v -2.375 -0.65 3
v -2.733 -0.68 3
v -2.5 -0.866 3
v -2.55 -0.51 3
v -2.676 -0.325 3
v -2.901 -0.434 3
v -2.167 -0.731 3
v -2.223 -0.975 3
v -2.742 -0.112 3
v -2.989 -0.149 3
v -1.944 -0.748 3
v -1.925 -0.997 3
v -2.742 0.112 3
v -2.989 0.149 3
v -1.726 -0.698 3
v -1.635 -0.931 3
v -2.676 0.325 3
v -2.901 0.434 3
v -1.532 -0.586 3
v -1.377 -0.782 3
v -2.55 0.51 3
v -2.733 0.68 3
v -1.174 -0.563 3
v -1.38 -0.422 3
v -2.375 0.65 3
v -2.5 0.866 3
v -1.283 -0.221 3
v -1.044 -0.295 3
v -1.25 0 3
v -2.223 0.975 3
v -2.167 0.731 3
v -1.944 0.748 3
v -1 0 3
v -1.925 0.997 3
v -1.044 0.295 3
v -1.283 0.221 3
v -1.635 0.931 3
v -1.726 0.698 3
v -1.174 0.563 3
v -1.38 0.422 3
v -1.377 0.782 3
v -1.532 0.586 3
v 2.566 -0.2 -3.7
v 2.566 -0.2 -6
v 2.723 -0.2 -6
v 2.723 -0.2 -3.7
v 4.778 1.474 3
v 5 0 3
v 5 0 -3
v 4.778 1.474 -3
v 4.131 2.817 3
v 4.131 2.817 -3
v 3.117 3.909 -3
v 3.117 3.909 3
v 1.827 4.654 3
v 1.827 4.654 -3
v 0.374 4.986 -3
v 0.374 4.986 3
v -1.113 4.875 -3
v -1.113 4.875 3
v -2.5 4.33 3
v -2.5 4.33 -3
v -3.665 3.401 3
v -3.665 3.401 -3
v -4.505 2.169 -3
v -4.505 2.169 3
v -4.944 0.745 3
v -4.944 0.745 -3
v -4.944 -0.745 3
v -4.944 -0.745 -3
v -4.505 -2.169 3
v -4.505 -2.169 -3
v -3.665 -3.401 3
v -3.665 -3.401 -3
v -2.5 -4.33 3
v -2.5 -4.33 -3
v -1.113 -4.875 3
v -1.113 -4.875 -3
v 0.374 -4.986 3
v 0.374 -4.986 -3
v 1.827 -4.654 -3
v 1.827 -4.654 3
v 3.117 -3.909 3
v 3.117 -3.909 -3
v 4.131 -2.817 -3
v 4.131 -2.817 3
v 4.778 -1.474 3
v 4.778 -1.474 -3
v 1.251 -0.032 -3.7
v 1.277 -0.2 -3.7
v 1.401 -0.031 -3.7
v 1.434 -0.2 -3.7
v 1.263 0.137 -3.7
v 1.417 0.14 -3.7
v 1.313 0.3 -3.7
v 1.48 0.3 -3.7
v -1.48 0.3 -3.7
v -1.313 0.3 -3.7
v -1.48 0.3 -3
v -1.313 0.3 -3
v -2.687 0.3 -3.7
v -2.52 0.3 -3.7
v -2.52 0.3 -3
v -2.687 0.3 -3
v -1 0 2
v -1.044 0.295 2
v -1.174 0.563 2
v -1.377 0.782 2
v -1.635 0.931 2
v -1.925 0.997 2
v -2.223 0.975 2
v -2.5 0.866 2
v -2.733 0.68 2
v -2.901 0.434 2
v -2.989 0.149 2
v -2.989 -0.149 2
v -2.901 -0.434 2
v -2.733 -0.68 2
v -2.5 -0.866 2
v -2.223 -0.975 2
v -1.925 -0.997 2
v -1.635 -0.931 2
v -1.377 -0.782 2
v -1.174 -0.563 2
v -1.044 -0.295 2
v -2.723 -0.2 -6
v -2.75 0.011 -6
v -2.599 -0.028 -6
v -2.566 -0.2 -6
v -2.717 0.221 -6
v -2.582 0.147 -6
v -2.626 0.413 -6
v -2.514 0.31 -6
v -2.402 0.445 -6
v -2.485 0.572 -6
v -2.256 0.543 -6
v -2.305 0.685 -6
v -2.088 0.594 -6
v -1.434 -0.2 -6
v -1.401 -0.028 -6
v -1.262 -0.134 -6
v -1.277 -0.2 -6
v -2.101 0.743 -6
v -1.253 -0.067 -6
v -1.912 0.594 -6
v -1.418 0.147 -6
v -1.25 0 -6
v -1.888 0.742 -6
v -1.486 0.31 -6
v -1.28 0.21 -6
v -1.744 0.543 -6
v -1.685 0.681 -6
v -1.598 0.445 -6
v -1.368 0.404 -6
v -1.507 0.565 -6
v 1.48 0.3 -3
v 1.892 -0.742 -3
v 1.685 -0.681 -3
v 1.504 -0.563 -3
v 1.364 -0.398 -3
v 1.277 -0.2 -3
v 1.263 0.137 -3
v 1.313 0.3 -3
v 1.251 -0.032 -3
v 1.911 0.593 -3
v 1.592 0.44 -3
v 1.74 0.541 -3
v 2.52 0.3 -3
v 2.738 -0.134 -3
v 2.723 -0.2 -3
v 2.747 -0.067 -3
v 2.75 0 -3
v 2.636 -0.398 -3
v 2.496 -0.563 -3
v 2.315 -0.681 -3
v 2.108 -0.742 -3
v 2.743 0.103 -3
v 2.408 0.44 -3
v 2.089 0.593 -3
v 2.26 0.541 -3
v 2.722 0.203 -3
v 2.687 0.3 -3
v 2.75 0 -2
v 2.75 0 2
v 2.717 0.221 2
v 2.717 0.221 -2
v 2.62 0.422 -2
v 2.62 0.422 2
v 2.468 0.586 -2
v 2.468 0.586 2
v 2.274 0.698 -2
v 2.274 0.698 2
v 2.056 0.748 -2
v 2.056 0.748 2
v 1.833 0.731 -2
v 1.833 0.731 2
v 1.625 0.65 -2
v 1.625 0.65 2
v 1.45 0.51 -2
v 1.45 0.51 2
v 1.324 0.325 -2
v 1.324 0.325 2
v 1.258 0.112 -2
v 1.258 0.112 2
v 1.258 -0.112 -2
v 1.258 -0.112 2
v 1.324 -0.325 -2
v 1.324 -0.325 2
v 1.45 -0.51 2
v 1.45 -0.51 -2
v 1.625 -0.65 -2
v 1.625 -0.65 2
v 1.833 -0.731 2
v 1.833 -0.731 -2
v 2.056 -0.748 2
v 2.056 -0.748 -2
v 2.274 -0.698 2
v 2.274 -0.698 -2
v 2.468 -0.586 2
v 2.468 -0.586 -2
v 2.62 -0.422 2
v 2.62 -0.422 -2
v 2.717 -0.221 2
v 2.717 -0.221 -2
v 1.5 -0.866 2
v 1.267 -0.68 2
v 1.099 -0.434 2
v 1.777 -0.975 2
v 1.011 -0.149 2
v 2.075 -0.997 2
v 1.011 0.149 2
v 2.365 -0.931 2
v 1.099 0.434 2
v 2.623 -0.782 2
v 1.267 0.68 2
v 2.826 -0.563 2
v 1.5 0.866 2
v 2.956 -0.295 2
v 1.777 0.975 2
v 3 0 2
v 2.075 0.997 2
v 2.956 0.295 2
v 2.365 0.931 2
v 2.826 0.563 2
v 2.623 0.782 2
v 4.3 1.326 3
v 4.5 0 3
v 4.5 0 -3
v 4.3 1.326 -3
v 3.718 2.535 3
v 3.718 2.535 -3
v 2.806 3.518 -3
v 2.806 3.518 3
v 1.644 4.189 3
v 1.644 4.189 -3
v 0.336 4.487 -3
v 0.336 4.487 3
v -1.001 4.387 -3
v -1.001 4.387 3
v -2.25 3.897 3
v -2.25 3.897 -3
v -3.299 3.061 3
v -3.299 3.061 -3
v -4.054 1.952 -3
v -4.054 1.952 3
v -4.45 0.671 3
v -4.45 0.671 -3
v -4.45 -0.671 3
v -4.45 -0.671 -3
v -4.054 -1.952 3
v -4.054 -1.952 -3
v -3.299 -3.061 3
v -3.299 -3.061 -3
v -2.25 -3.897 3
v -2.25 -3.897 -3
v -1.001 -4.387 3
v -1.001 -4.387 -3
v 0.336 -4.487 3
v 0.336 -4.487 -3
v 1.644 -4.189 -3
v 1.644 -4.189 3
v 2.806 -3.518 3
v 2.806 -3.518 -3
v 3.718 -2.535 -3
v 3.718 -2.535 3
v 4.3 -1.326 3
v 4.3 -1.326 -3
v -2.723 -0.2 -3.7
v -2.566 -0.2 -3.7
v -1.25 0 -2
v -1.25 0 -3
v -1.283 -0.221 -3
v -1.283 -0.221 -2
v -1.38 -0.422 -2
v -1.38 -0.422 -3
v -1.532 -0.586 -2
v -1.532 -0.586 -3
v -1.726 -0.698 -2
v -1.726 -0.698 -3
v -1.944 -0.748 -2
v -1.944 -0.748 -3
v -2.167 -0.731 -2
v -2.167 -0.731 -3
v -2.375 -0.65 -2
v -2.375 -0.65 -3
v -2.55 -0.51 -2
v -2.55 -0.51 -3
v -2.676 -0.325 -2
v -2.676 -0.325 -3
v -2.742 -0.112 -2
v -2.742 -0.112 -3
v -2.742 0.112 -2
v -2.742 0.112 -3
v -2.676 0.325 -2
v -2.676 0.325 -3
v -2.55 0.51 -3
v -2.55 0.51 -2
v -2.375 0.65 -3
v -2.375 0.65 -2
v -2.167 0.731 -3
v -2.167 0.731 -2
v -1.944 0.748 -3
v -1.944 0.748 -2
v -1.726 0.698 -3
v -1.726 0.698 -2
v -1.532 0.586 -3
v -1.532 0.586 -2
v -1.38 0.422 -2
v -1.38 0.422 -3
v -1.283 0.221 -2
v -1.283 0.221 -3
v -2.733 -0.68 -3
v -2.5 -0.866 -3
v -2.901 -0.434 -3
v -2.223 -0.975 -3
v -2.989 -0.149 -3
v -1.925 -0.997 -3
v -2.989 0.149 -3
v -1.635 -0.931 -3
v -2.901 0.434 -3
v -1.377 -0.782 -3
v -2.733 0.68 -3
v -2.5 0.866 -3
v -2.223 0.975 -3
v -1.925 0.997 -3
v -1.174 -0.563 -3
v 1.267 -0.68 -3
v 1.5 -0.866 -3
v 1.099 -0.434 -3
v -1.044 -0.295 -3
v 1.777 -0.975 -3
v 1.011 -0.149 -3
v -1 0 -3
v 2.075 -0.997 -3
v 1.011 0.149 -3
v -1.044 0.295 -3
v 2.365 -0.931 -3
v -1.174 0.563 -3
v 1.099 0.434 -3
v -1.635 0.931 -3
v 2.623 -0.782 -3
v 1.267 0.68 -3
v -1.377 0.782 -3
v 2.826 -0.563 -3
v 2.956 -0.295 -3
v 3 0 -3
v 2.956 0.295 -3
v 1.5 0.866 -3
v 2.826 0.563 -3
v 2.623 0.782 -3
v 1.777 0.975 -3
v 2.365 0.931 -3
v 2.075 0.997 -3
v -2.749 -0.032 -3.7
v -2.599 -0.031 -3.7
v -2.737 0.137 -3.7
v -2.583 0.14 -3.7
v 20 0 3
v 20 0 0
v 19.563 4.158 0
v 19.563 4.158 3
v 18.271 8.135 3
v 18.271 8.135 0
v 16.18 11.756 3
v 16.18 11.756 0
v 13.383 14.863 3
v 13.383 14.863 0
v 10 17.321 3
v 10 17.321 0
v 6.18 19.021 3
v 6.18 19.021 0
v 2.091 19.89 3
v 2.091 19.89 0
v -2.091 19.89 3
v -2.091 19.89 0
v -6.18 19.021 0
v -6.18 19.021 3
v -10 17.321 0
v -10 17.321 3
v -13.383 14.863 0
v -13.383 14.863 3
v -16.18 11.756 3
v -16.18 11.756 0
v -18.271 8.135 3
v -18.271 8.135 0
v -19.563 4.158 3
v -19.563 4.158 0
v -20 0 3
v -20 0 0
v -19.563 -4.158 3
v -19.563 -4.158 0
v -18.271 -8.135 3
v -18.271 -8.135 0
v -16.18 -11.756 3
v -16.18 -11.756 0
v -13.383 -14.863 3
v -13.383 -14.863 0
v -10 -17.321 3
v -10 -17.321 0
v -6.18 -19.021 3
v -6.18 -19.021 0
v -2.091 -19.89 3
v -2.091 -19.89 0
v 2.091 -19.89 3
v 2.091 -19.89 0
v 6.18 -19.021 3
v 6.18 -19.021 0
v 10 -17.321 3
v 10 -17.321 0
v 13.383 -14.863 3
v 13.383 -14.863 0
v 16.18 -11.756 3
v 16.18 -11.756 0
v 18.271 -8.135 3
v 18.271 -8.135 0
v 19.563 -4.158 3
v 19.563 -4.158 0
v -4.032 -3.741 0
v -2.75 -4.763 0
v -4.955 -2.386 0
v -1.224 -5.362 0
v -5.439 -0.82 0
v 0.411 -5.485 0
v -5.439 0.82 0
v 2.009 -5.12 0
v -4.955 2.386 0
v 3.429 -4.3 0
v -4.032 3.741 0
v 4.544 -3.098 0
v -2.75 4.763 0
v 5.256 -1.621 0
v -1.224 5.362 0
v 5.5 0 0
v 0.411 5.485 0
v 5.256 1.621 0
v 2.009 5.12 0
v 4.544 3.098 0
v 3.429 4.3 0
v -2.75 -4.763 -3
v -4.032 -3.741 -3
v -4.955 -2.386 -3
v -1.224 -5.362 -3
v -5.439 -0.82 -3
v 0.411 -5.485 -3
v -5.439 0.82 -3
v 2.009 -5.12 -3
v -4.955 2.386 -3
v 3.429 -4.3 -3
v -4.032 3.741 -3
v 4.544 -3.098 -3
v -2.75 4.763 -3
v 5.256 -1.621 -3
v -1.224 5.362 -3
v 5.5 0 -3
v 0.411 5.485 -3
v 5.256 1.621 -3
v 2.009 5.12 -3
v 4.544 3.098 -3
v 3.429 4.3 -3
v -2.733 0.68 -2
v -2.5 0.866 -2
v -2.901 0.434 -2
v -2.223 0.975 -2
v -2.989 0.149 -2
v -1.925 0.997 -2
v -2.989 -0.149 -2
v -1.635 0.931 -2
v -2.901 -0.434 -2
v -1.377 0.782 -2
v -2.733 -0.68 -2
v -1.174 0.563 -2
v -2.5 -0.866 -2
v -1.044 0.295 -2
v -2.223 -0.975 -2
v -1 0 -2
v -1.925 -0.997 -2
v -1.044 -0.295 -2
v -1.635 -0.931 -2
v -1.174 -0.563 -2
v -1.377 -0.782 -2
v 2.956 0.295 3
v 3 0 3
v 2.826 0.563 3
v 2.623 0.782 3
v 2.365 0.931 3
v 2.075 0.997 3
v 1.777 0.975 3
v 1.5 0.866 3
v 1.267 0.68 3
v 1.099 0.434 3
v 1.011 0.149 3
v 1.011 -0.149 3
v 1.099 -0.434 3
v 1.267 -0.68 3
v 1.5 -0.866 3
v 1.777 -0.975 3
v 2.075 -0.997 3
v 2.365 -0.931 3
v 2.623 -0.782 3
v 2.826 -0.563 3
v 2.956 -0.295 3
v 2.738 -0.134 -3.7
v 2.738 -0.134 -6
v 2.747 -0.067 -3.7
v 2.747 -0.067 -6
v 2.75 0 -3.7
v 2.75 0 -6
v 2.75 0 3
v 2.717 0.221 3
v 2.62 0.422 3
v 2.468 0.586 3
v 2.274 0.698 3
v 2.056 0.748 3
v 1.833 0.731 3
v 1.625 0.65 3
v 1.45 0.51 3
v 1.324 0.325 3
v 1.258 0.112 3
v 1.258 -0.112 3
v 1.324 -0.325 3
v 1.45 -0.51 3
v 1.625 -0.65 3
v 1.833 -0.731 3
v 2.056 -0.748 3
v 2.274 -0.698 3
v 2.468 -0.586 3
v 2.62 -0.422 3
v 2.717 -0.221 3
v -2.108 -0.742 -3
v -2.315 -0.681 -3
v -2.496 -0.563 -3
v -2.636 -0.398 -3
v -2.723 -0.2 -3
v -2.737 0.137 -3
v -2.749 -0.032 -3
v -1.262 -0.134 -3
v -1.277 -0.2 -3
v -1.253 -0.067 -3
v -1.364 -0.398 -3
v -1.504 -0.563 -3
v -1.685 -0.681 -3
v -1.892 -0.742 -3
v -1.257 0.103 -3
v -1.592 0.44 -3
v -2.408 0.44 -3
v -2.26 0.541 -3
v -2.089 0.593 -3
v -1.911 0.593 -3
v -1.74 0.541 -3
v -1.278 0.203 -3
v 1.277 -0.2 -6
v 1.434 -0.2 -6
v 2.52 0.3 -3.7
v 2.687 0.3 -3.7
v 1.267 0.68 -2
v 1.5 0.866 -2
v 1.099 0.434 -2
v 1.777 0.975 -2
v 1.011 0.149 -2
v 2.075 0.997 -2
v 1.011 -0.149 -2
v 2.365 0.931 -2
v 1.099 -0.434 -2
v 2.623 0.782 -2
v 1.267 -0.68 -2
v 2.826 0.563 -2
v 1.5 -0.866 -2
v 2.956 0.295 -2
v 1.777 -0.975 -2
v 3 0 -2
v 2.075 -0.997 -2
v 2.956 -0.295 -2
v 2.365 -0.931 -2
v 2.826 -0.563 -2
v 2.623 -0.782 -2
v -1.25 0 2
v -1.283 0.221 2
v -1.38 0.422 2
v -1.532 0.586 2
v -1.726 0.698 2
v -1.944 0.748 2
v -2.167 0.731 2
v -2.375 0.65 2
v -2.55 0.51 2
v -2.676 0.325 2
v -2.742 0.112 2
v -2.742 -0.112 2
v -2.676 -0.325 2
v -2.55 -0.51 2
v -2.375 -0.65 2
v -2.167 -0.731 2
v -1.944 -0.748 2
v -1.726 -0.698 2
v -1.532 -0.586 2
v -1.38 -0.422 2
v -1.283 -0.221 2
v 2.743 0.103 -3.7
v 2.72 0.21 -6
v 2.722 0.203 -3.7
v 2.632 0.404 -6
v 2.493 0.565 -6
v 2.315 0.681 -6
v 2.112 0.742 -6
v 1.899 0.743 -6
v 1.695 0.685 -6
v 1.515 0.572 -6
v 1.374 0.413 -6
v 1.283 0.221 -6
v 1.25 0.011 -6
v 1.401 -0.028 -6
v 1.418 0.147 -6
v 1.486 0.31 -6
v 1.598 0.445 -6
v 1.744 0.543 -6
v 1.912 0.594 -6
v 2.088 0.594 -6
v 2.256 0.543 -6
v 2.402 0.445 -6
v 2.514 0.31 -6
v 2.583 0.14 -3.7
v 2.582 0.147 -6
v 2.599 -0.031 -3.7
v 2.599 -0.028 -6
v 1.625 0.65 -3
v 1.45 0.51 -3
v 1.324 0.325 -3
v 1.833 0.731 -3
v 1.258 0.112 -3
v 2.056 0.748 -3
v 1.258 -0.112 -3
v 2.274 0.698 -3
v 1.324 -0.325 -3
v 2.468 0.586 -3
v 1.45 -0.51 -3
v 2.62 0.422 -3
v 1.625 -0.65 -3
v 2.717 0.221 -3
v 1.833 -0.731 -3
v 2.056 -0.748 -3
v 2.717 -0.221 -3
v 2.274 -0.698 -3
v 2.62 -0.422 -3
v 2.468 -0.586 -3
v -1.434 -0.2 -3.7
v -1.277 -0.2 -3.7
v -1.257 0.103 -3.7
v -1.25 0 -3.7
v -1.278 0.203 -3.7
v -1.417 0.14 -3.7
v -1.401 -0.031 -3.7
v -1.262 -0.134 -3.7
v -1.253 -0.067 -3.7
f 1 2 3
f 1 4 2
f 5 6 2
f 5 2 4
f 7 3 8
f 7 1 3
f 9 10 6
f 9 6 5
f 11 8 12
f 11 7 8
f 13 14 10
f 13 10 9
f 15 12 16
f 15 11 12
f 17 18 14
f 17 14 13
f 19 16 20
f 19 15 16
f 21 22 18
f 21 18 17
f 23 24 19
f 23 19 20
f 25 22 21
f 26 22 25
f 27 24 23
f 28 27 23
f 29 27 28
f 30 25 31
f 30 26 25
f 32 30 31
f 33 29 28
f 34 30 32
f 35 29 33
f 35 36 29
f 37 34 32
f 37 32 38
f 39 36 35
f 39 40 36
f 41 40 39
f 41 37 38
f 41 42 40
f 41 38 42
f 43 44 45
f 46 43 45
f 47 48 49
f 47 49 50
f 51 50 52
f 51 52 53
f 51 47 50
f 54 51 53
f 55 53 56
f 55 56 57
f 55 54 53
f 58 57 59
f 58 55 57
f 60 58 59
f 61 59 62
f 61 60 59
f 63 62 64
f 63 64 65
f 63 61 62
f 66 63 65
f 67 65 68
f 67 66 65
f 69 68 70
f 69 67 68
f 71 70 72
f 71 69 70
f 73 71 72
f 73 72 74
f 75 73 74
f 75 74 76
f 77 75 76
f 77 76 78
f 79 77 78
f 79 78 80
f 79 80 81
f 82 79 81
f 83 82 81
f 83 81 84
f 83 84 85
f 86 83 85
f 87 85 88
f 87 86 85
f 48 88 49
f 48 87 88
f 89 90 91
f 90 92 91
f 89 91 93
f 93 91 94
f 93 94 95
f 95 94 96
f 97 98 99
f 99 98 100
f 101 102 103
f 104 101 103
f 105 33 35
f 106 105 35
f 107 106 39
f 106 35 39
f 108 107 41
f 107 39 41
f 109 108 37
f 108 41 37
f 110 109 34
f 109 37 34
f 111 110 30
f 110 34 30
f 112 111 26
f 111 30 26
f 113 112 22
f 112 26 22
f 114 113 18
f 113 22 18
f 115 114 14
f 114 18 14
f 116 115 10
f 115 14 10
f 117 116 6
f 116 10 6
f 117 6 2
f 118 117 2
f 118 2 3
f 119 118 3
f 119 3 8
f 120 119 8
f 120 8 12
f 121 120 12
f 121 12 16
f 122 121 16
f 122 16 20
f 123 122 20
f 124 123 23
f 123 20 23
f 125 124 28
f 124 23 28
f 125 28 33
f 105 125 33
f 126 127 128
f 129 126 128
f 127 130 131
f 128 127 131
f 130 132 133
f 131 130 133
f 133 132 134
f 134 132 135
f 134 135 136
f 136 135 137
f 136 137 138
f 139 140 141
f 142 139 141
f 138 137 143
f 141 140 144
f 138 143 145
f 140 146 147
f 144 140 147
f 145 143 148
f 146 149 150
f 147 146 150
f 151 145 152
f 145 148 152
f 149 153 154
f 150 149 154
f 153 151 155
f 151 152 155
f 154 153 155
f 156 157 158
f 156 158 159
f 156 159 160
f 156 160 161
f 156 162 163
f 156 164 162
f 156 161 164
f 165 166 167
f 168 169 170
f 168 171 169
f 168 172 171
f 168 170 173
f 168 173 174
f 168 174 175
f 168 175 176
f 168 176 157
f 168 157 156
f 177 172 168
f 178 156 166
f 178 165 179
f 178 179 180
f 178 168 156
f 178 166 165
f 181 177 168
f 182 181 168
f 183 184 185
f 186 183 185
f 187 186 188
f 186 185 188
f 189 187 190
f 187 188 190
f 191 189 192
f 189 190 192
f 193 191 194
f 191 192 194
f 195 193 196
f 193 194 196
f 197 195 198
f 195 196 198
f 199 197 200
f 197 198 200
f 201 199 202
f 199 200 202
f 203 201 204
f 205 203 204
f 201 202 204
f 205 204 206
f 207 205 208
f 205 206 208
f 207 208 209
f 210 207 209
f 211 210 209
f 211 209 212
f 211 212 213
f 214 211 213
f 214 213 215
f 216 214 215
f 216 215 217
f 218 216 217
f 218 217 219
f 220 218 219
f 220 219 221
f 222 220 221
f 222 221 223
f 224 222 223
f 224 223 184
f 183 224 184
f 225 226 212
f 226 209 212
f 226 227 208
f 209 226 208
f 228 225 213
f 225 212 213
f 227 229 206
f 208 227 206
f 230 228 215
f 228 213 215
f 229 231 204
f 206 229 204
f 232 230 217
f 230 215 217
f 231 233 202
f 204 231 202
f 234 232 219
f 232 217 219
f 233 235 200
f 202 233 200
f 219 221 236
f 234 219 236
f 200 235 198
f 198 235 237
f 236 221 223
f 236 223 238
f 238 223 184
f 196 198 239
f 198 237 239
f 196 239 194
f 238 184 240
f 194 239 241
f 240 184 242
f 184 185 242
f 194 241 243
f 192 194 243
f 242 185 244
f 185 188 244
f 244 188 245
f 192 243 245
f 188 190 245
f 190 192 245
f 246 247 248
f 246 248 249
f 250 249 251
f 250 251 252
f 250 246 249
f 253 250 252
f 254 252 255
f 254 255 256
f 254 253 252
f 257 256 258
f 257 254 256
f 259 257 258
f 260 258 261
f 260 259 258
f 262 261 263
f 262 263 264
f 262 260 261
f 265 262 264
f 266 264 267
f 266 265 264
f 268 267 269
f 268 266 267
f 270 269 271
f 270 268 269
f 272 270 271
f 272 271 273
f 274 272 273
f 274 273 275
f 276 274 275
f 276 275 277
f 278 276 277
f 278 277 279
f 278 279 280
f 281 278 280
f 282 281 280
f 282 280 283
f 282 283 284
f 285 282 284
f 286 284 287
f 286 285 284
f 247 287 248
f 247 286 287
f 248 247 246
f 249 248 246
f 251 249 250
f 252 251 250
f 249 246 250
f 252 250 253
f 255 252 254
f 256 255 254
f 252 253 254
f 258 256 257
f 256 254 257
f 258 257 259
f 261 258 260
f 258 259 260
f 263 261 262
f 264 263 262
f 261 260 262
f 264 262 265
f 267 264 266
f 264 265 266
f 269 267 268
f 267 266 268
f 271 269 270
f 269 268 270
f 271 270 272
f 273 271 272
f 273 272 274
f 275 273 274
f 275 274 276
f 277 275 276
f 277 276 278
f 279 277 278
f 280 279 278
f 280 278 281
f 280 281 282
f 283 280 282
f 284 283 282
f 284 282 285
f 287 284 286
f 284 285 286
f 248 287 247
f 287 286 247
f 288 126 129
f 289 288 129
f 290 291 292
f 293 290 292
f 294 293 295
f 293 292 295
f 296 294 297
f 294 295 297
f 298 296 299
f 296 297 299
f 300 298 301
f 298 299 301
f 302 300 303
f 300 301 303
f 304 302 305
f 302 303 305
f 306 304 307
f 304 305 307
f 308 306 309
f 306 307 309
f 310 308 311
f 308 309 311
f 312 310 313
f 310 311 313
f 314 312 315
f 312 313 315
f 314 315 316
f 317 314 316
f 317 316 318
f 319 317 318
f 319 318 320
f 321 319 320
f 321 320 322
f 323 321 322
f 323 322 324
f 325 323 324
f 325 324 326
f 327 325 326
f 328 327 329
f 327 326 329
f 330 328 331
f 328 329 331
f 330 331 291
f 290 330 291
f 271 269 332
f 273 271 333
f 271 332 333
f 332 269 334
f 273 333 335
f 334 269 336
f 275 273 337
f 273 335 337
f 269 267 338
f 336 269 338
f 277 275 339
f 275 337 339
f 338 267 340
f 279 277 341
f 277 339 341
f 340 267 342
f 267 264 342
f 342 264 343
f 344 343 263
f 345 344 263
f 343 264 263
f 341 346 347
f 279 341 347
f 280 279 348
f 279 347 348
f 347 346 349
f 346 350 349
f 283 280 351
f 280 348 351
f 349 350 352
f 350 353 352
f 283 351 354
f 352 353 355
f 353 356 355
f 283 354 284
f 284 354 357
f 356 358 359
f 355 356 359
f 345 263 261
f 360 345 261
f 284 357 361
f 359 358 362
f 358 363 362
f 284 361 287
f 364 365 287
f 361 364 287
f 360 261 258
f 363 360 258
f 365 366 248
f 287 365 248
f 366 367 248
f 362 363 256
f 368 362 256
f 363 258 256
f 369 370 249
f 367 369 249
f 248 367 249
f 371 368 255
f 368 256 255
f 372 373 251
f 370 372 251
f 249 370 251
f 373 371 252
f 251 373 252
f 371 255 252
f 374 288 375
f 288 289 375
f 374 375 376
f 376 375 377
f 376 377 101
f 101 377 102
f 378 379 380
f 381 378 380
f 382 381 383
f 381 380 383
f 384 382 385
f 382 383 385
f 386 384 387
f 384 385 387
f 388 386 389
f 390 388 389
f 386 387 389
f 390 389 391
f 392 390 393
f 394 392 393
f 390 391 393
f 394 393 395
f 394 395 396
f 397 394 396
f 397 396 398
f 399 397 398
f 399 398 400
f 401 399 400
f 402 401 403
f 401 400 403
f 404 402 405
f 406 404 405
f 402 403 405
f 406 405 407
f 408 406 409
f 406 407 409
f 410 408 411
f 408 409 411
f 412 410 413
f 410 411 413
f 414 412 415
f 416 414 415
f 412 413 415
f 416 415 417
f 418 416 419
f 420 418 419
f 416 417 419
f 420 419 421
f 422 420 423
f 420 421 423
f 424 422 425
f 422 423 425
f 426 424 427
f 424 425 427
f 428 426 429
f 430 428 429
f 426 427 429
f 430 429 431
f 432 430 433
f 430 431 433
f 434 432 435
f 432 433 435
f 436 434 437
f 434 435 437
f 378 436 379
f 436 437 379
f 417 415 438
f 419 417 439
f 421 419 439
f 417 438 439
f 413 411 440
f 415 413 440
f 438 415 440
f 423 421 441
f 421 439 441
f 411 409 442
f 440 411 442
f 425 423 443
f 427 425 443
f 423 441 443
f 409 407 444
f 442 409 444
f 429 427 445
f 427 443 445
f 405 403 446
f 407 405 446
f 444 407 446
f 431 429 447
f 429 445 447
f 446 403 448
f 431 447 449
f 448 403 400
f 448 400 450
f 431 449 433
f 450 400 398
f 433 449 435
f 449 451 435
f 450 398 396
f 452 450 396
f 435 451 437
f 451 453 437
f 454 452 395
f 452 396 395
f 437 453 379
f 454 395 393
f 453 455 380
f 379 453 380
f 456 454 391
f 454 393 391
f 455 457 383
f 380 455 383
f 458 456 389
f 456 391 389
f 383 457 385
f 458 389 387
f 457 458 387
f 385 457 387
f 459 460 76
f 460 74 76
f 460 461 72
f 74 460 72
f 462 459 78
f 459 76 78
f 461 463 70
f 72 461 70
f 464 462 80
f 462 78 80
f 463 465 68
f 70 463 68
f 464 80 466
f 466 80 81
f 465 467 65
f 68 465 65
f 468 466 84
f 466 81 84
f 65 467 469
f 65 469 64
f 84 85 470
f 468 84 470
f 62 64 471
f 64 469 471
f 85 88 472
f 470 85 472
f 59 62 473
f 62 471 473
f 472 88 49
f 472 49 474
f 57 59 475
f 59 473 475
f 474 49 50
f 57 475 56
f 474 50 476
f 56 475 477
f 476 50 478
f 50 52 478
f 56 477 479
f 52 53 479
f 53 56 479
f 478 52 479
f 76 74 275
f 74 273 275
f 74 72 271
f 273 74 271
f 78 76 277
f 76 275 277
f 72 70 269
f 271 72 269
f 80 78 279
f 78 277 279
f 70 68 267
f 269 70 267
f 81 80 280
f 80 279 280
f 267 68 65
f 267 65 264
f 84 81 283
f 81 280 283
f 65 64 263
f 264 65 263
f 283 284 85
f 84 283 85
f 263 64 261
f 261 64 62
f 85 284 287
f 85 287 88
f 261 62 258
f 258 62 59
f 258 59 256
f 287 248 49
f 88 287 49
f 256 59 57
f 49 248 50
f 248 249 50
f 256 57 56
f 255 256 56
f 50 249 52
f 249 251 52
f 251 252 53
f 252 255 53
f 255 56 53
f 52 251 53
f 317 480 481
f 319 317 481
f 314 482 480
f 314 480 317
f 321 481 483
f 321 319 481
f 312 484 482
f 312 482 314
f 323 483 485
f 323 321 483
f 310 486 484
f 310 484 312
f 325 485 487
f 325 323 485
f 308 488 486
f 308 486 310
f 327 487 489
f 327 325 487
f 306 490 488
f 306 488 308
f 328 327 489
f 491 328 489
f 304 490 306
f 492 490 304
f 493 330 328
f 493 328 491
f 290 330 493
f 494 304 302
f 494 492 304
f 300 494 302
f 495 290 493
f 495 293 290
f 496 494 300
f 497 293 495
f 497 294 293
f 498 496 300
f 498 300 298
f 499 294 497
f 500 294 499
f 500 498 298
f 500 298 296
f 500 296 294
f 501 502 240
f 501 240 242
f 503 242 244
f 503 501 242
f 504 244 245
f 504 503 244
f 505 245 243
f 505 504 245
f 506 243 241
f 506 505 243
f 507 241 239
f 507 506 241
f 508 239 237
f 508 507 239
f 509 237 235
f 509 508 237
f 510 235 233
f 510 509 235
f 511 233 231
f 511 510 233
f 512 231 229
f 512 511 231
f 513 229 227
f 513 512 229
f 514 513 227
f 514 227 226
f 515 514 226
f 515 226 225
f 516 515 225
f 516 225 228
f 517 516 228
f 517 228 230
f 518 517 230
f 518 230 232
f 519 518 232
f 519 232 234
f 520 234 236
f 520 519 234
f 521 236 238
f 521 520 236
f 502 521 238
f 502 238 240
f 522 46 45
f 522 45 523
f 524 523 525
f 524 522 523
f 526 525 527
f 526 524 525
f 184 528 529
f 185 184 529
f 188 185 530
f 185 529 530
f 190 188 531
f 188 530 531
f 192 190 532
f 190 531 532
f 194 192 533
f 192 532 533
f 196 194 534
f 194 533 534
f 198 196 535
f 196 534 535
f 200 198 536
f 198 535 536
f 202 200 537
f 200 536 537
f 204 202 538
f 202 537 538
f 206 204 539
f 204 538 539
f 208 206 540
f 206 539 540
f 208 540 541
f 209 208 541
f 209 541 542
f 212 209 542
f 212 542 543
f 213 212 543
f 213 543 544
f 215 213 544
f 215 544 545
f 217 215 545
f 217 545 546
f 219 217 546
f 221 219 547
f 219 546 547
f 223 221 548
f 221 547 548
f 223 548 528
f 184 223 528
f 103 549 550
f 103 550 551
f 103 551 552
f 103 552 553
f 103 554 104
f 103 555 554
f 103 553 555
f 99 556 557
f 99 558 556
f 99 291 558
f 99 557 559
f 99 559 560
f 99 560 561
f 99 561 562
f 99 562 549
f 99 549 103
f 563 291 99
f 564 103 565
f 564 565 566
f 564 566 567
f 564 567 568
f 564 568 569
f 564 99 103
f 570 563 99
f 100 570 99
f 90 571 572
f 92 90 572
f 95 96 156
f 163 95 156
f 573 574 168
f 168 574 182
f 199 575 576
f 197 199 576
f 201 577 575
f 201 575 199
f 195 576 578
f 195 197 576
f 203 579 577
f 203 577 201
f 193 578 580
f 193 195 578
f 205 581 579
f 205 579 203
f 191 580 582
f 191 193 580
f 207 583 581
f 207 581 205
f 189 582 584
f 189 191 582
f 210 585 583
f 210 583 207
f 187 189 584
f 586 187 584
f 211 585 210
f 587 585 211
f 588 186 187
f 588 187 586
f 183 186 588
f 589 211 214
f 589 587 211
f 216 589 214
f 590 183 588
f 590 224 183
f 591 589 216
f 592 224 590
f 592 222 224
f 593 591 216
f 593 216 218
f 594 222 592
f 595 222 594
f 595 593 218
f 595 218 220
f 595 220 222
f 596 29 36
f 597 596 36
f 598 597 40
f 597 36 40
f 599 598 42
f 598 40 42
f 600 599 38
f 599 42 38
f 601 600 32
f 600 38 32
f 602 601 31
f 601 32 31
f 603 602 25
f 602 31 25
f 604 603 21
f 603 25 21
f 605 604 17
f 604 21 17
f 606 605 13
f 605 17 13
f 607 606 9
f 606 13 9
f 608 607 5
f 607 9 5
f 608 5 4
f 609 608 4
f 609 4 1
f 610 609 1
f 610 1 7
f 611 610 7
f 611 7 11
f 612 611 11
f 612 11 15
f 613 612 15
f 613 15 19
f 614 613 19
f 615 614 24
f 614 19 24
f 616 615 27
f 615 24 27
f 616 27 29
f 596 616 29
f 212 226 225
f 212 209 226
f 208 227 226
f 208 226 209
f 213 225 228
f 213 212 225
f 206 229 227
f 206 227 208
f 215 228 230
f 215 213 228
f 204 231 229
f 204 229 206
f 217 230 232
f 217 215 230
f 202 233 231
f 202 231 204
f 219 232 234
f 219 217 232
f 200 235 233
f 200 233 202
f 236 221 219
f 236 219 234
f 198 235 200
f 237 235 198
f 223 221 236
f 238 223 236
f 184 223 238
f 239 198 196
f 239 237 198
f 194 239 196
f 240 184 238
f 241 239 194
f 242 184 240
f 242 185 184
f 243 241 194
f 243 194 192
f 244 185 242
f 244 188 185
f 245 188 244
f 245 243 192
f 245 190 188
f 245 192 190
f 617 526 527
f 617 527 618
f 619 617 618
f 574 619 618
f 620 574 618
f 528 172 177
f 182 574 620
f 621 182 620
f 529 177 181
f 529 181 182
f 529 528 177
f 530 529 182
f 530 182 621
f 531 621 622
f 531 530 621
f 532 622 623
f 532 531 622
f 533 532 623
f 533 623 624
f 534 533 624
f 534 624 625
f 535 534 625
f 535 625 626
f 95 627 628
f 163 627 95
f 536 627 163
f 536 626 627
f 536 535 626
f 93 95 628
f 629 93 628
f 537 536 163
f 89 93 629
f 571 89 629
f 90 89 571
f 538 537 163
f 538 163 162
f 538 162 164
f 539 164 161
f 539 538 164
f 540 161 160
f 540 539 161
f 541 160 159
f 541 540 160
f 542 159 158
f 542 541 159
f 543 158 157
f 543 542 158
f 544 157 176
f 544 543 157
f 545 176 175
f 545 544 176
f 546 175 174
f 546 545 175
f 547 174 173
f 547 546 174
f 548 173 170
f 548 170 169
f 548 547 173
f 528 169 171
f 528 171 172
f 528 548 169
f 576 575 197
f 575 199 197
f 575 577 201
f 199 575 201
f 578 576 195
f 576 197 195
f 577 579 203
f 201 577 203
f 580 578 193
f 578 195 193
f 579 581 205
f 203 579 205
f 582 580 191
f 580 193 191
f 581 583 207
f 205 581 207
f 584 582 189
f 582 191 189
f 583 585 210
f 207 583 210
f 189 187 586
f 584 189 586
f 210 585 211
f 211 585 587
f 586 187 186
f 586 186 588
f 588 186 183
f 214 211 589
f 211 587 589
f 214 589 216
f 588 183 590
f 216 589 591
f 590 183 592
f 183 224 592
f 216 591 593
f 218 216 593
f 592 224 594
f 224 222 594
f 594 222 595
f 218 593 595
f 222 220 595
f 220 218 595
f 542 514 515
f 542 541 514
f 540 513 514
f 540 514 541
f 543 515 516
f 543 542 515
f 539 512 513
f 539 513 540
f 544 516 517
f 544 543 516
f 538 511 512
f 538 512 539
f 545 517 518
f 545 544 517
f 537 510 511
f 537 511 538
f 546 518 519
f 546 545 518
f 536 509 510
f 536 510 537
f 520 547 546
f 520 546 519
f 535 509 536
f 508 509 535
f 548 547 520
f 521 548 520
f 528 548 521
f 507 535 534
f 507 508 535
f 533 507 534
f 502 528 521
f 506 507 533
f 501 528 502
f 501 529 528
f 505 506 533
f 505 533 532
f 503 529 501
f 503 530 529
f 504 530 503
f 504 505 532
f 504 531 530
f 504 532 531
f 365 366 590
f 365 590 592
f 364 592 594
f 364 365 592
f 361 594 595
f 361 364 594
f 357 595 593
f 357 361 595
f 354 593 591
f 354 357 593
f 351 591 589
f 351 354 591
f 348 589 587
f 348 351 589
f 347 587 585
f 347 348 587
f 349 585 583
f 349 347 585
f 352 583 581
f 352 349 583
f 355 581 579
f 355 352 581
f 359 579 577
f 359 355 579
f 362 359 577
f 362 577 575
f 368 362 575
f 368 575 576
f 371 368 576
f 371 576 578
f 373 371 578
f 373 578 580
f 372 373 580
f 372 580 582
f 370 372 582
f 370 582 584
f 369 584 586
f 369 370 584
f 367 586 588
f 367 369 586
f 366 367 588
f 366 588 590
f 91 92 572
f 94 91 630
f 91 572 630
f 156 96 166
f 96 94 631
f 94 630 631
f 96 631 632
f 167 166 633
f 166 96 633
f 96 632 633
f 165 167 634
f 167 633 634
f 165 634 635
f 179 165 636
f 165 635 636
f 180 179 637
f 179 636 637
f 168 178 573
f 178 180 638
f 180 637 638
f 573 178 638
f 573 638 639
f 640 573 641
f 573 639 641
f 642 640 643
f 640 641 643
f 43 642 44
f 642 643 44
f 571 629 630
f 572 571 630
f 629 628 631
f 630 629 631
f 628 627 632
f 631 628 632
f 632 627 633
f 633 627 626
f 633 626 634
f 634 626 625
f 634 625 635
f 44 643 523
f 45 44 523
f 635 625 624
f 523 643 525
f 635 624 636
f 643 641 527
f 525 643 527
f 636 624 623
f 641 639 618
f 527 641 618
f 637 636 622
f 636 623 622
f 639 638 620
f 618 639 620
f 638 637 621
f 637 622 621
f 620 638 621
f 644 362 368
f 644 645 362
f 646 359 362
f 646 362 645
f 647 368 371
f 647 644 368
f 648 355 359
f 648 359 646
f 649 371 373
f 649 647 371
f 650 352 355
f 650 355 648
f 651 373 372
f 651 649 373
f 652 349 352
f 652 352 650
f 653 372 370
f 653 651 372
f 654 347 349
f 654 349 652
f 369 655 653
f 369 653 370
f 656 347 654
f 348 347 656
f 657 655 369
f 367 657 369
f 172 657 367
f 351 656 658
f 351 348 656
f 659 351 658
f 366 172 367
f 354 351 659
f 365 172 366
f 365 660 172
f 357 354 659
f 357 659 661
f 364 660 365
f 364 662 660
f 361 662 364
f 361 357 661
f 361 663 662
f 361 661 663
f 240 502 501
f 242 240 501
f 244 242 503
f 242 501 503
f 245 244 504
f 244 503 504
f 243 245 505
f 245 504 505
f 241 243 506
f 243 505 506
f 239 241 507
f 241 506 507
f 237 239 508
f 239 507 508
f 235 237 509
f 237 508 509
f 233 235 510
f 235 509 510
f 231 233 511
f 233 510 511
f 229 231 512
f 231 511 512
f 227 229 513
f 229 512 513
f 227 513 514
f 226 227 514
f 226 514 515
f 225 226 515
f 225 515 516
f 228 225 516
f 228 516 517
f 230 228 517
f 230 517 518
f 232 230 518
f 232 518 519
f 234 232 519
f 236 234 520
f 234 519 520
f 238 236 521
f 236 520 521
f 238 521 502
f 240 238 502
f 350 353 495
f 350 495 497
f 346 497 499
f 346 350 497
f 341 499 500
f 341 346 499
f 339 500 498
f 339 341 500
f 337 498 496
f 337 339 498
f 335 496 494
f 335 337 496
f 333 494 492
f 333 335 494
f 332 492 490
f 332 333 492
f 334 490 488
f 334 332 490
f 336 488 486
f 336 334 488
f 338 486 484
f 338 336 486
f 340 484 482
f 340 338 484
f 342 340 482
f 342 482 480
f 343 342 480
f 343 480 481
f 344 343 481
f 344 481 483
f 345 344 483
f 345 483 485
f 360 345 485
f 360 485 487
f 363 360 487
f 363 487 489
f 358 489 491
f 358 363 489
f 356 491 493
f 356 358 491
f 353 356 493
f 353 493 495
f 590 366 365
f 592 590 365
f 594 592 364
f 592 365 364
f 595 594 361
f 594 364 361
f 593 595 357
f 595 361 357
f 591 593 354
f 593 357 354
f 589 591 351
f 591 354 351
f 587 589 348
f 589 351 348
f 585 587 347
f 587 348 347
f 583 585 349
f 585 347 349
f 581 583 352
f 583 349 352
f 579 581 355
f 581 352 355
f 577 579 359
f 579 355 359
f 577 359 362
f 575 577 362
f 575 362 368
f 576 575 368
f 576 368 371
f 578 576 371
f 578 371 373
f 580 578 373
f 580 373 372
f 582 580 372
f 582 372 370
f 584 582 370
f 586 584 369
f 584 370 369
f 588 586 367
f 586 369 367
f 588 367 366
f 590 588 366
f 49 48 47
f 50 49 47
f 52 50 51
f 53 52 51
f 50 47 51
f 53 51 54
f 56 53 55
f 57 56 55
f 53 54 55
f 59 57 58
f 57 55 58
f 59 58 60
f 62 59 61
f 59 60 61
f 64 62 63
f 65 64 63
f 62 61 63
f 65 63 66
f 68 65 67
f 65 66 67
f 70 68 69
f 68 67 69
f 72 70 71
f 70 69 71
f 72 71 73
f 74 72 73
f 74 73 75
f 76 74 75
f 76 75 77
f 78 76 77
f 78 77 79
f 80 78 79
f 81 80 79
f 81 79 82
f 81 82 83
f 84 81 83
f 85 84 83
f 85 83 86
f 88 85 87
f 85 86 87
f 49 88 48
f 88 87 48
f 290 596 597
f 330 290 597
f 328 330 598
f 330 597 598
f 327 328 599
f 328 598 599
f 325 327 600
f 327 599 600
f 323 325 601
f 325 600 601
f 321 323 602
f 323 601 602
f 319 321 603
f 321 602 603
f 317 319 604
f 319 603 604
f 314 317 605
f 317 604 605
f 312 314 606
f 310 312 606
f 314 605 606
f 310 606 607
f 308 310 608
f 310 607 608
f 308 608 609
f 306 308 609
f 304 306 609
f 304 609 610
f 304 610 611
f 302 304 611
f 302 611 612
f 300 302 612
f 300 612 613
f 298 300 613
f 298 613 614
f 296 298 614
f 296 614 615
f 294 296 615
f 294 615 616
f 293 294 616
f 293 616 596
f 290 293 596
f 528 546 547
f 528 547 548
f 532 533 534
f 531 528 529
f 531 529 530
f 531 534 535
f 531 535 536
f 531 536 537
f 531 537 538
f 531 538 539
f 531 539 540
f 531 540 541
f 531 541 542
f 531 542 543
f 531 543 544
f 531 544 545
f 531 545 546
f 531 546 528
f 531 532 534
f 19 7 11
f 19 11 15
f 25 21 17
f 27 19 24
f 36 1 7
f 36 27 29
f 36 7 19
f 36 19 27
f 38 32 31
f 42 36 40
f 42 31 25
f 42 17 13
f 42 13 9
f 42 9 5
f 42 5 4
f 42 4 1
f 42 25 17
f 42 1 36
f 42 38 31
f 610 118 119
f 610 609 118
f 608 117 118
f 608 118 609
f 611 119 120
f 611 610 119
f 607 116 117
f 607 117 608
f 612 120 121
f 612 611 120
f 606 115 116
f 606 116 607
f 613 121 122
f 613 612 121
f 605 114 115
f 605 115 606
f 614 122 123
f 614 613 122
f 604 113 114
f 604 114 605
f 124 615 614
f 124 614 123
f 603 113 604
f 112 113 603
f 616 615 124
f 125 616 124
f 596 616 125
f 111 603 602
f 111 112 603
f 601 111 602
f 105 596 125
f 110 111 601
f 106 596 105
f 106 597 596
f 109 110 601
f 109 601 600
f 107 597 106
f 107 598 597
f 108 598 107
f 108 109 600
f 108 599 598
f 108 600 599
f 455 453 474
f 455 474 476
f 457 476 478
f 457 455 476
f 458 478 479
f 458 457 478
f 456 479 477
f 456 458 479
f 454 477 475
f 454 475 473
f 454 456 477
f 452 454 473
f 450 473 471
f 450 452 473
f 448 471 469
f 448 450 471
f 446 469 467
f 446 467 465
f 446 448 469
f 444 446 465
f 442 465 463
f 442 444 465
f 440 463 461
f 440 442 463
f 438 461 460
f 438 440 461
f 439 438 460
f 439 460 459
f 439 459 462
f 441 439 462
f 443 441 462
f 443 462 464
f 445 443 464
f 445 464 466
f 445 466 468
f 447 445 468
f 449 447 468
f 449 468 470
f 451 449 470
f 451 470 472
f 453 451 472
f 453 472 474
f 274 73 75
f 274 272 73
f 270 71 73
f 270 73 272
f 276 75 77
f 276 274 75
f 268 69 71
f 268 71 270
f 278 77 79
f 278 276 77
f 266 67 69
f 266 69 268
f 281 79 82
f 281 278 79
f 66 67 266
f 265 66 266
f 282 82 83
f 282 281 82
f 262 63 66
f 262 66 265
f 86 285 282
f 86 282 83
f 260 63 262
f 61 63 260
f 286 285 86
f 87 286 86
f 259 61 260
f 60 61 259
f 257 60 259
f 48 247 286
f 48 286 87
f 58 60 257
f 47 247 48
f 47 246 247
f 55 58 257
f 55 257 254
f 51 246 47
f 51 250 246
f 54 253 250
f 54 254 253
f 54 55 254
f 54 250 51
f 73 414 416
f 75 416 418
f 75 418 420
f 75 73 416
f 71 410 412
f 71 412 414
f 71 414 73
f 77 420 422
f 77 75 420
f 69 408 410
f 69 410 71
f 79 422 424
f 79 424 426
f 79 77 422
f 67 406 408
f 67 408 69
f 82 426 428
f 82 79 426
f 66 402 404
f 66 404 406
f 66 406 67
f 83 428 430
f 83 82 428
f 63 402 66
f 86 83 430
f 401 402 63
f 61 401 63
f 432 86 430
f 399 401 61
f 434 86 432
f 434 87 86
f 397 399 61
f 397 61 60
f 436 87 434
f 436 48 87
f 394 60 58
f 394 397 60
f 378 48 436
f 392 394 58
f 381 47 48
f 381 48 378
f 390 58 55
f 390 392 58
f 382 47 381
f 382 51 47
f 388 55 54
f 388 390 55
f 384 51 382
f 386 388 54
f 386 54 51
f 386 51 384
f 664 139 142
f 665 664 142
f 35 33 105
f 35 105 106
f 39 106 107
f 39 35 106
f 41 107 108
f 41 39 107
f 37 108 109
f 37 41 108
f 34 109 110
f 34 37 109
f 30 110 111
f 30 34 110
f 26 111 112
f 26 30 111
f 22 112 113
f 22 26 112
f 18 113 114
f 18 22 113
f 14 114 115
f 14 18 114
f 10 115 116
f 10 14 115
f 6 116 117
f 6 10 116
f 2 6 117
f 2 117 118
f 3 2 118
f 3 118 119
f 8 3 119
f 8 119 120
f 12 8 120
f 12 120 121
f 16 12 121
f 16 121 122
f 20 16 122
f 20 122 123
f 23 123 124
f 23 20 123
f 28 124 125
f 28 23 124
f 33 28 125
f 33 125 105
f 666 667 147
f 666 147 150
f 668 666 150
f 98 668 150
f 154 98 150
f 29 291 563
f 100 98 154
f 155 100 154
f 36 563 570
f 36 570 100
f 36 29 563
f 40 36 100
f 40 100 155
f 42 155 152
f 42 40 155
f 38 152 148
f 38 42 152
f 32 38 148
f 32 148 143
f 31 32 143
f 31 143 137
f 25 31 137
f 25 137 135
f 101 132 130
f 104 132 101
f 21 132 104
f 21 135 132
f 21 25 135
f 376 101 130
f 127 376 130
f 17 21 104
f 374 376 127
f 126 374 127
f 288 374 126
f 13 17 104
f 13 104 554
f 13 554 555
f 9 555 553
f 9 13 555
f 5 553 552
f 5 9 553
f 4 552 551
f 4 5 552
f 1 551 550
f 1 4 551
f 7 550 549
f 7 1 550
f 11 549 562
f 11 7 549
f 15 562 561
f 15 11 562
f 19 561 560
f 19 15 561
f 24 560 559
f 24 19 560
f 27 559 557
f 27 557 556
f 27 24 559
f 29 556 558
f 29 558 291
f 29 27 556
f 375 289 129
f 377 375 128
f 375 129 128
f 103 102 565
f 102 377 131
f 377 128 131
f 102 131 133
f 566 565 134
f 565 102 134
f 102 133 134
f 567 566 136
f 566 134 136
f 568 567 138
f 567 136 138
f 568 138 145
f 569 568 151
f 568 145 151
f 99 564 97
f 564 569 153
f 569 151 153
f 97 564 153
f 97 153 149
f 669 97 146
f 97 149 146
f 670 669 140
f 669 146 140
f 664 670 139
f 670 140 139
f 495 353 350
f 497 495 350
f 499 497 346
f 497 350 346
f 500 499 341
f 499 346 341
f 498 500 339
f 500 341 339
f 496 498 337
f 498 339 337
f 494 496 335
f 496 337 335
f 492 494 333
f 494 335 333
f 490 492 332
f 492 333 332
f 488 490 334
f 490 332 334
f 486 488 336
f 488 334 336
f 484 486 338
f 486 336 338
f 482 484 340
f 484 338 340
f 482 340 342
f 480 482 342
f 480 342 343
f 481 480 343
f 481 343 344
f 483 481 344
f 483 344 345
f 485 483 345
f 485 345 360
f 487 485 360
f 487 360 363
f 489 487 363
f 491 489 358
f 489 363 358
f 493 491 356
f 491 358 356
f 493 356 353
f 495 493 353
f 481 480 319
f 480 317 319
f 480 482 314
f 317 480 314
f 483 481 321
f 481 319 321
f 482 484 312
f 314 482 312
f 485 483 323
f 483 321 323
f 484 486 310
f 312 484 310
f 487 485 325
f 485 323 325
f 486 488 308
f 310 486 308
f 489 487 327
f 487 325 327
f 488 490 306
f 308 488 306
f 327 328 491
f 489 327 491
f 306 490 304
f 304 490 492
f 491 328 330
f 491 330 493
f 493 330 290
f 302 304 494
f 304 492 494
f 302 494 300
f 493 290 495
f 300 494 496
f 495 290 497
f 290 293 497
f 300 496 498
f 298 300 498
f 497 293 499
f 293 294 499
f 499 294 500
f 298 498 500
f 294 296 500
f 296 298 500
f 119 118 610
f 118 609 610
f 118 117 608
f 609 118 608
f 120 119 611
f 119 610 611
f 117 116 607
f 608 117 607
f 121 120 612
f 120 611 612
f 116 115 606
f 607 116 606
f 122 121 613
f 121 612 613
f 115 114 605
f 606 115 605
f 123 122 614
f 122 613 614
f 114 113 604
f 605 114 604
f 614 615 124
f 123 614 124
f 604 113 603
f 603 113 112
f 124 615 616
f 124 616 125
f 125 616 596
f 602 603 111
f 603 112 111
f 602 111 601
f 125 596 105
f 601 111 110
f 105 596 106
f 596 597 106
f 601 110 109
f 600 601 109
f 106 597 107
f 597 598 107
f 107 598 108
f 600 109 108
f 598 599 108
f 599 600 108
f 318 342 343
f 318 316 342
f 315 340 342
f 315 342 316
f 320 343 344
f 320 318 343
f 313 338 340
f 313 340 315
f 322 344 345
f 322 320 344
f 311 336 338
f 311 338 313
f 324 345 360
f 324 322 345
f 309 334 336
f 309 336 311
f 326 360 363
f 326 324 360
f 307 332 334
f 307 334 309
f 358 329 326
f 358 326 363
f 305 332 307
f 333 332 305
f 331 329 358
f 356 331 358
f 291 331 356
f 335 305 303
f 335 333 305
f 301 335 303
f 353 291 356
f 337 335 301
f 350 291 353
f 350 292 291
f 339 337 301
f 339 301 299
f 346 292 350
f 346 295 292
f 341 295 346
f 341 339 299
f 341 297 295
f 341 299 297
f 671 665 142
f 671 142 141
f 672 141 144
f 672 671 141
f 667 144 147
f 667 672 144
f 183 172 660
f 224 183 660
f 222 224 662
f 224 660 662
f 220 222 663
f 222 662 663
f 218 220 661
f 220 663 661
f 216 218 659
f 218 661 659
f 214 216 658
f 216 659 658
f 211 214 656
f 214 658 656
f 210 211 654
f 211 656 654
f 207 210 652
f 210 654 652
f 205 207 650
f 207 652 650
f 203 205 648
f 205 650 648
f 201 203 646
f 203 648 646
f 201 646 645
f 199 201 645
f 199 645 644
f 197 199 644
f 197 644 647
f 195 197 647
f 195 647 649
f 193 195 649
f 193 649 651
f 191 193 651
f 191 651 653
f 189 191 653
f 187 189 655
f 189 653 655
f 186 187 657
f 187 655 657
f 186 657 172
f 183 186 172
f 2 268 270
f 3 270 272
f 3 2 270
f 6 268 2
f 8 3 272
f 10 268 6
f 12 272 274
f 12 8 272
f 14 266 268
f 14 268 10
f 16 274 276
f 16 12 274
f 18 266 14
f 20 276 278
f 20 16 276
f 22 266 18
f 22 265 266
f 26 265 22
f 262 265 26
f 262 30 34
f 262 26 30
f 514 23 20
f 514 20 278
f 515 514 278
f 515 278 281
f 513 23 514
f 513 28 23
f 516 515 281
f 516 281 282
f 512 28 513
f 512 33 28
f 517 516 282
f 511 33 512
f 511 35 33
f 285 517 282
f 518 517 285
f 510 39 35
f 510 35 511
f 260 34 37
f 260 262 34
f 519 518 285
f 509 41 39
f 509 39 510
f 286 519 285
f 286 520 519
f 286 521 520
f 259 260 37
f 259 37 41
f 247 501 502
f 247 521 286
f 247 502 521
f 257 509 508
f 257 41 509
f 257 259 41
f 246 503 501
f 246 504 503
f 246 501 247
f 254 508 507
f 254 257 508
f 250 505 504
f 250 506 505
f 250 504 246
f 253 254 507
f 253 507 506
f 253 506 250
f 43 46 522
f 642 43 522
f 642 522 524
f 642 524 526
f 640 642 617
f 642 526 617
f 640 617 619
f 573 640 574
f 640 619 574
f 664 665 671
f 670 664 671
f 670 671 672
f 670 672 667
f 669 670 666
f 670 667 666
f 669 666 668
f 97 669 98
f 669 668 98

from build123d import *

# Parameters (mm, degrees)
F0_R      = 20
F0_R_2    = 5.5
F1_DEPTH  = 3
F2_R      = 5.5
F2_R_2    = 5
F3_DEPTH  = 6
F4_R      = 5
F4_R_2    = 4.5
F5_DEPTH  = 6
F6_R      = 4.5
F7_DEPTH  = 6
F8_R      = 1
F9_DEPTH  = 1
F11_R     = 1
F11_R_2   = 0.75
F12_DEPTH = 1
F13_R     = 0.75
F14_DEPTH = 9
F16_DEPTH = 3
F17_W     = 6.3846809013
F17_H     = 1
F18_DEPTH = 12.5
F19_W     = 1.7936326425
F19_H     = 0.7
F20_DEPTH = 12.5
F10_R     = 1
F21_DEPTH = 1
F22_R     = 1
F22_R_2   = 0.75
F23_DEPTH = 1
F24_R     = 0.75
F25_DEPTH = 25


with BuildPart() as f1:
    # F0 (on Top) → F1 (new body)
    with BuildSketch(Plane.XY):
        Circle(F0_R)
        Circle(F0_R_2, mode=Mode.SUBTRACT)
    extrude(amount=F1_DEPTH)

    # F2 (on face) → F3 (join)
    with BuildSketch(Plane.XY.offset(3)):
        Circle(F2_R)
        Circle(F2_R_2, mode=Mode.SUBTRACT)
    extrude(amount=-F3_DEPTH)

    # F17 (on Right) → F18 (cut, symmetric)
    with BuildSketch(Plane.YZ):
        with Locations((-2.9923404506, -9.5)):
            Rectangle(F17_W, F17_H)
    extrude(amount=F18_DEPTH, both=True, mode=Mode.SUBTRACT)


with BuildPart() as f5:
    # F4 (on face) → F5 (new body)
    with BuildSketch(Plane.XY.offset(3)):
        Circle(F4_R)
        Circle(F4_R_2, mode=Mode.SUBTRACT)
    extrude(amount=-F5_DEPTH)


with BuildPart() as f7:
    # F6 (on face) → F7 (new body)
    with BuildSketch(Plane.XY.offset(3)):
        Circle(F6_R)
    extrude(amount=-F7_DEPTH)

    # F8 (on face) → F9 (cut)
    with BuildSketch(Plane.XY.offset(3)):
        with Locations((-2, 0)):
            Circle(F8_R)
        with Locations((2, 0)):
            Circle(F8_R)
    extrude(amount=-F9_DEPTH, mode=Mode.SUBTRACT)

    # F10 (on face) → F21 (cut)
    with BuildSketch(Plane(origin=(0, 0, -3), x_dir=(1, 0, 0), z_dir=(0, 0, -1))):
        with Locations((-2, 0)):
            Circle(F10_R)
        with Locations((2, 0)):
            Circle(F10_R)
    extrude(amount=-F21_DEPTH, mode=Mode.SUBTRACT)

    # F24 (on face) → F25 (cut)
    with BuildSketch(Plane.XY.offset(2)):
        with Locations((-2, 0)):
            Circle(F24_R)
        with Locations((2, 0)):
            Circle(F24_R)
    extrude(amount=-F25_DEPTH, mode=Mode.SUBTRACT)


with BuildPart() as f12:
    # F11 (on face) → F12 (new body)
    with BuildSketch(Plane.XY.offset(3)):
        with Locations((-2, 0)):
            Circle(F11_R)
        with Locations((-2, 0)):
            Circle(F11_R_2, mode=Mode.SUBTRACT)
    extrude(amount=-F12_DEPTH)


with BuildPart() as f12b:
    # F11 (on face) → F12, piece 2 (new body)
    with BuildSketch(Plane.XY.offset(3)):
        with Locations((2, 0)):
            Circle(F11_R)
        with Locations((2, 0)):
            Circle(F11_R_2, mode=Mode.SUBTRACT)
    extrude(amount=-F12_DEPTH)


with BuildPart() as f14:
    # F13 (on face) → F14 (new body)
    with BuildSketch(Plane.XY.offset(3)):
        with Locations((-2, 0)):
            Circle(F13_R)
    extrude(amount=-F14_DEPTH)


with BuildPart() as f14b:
    # F13 (on face) → F14, piece 2 (new body)
    with BuildSketch(Plane.XY.offset(3)):
        with Locations((2, 0)):
            Circle(F13_R)
    extrude(amount=-F14_DEPTH)


with BuildPart() as f16_tool:
    # F15 (on face) → F16 (new body)
    with BuildSketch(Plane(origin=(0, 0, -6), x_dir=(1, 0, 0), z_dir=(0, 0, -1))):
        with BuildLine():
            Line((-1.4343145751, 0.2), (-1.2771583853, 0.2))
            ThreePointArc((-1.2771583853, 0.2), (-2, 0.75), (-2.7228416147, 0.2))
            Line((-2.7228416147, 0.2), (-2.5656854249, 0.2))
            ThreePointArc((-2.5656854249, 0.2), (-2, -0.6), (-1.4343145751, 0.2))
        make_face()
        with BuildLine():
            Line((2.5656854249, 0.2), (2.7228416147, 0.2))
            ThreePointArc((2.7228416147, 0.2), (2, 0.75), (1.2771583853, 0.2))
            Line((1.2771583853, 0.2), (1.4343145751, 0.2))
            ThreePointArc((1.4343145751, 0.2), (2, -0.6), (2.5656854249, 0.2))
        make_face()
    extrude(amount=-F16_DEPTH)


with BuildPart() as f14_1:
    add(f14.part)

    # F16: cut by f16_tool
    add(f16_tool.part, mode=Mode.SUBTRACT)


with BuildPart() as f14b_1:
    add(f14b.part)

    # F16: cut by f16_tool
    add(f16_tool.part, mode=Mode.SUBTRACT)


with BuildPart() as f20_tool:
    # F19 (on Right) → F20 (new body, symmetric)
    with BuildSketch(Plane.YZ):
        with Locations((-0.5968163213, -3.35)):
            Rectangle(F19_W, F19_H)
    extrude(amount=F20_DEPTH, both=True)


with BuildPart() as f14_2:
    add(f14_1.part)

    # F20: cut by f20_tool
    add(f20_tool.part, mode=Mode.SUBTRACT)


with BuildPart() as f14b_2:
    add(f14b_1.part)

    # F20: cut by f20_tool
    add(f20_tool.part, mode=Mode.SUBTRACT)


with BuildPart() as f23:
    # F22 (on face) → F23 (new body)
    with BuildSketch(Plane(origin=(0, 0, -3), x_dir=(1, 0, 0), z_dir=(0, 0, -1))):
        with Locations((-2, 0)):
            Circle(F22_R)
        with Locations((-2, 0)):
            Circle(F22_R_2, mode=Mode.SUBTRACT)
    extrude(amount=-F23_DEPTH)


with BuildPart() as f23b:
    # F22 (on face) → F23, piece 2 (new body)
    with BuildSketch(Plane(origin=(0, 0, -3), x_dir=(1, 0, 0), z_dir=(0, 0, -1))):
        with Locations((2, 0)):
            Circle(F22_R)
        with Locations((2, 0)):
            Circle(F22_R_2, mode=Mode.SUBTRACT)
    extrude(amount=-F23_DEPTH)


solid = Compound([f1.part, f5.part, f7.part, f12.part, f12b.part, f14_2.part, f14b_2.part, f23.part, f23b.part])
